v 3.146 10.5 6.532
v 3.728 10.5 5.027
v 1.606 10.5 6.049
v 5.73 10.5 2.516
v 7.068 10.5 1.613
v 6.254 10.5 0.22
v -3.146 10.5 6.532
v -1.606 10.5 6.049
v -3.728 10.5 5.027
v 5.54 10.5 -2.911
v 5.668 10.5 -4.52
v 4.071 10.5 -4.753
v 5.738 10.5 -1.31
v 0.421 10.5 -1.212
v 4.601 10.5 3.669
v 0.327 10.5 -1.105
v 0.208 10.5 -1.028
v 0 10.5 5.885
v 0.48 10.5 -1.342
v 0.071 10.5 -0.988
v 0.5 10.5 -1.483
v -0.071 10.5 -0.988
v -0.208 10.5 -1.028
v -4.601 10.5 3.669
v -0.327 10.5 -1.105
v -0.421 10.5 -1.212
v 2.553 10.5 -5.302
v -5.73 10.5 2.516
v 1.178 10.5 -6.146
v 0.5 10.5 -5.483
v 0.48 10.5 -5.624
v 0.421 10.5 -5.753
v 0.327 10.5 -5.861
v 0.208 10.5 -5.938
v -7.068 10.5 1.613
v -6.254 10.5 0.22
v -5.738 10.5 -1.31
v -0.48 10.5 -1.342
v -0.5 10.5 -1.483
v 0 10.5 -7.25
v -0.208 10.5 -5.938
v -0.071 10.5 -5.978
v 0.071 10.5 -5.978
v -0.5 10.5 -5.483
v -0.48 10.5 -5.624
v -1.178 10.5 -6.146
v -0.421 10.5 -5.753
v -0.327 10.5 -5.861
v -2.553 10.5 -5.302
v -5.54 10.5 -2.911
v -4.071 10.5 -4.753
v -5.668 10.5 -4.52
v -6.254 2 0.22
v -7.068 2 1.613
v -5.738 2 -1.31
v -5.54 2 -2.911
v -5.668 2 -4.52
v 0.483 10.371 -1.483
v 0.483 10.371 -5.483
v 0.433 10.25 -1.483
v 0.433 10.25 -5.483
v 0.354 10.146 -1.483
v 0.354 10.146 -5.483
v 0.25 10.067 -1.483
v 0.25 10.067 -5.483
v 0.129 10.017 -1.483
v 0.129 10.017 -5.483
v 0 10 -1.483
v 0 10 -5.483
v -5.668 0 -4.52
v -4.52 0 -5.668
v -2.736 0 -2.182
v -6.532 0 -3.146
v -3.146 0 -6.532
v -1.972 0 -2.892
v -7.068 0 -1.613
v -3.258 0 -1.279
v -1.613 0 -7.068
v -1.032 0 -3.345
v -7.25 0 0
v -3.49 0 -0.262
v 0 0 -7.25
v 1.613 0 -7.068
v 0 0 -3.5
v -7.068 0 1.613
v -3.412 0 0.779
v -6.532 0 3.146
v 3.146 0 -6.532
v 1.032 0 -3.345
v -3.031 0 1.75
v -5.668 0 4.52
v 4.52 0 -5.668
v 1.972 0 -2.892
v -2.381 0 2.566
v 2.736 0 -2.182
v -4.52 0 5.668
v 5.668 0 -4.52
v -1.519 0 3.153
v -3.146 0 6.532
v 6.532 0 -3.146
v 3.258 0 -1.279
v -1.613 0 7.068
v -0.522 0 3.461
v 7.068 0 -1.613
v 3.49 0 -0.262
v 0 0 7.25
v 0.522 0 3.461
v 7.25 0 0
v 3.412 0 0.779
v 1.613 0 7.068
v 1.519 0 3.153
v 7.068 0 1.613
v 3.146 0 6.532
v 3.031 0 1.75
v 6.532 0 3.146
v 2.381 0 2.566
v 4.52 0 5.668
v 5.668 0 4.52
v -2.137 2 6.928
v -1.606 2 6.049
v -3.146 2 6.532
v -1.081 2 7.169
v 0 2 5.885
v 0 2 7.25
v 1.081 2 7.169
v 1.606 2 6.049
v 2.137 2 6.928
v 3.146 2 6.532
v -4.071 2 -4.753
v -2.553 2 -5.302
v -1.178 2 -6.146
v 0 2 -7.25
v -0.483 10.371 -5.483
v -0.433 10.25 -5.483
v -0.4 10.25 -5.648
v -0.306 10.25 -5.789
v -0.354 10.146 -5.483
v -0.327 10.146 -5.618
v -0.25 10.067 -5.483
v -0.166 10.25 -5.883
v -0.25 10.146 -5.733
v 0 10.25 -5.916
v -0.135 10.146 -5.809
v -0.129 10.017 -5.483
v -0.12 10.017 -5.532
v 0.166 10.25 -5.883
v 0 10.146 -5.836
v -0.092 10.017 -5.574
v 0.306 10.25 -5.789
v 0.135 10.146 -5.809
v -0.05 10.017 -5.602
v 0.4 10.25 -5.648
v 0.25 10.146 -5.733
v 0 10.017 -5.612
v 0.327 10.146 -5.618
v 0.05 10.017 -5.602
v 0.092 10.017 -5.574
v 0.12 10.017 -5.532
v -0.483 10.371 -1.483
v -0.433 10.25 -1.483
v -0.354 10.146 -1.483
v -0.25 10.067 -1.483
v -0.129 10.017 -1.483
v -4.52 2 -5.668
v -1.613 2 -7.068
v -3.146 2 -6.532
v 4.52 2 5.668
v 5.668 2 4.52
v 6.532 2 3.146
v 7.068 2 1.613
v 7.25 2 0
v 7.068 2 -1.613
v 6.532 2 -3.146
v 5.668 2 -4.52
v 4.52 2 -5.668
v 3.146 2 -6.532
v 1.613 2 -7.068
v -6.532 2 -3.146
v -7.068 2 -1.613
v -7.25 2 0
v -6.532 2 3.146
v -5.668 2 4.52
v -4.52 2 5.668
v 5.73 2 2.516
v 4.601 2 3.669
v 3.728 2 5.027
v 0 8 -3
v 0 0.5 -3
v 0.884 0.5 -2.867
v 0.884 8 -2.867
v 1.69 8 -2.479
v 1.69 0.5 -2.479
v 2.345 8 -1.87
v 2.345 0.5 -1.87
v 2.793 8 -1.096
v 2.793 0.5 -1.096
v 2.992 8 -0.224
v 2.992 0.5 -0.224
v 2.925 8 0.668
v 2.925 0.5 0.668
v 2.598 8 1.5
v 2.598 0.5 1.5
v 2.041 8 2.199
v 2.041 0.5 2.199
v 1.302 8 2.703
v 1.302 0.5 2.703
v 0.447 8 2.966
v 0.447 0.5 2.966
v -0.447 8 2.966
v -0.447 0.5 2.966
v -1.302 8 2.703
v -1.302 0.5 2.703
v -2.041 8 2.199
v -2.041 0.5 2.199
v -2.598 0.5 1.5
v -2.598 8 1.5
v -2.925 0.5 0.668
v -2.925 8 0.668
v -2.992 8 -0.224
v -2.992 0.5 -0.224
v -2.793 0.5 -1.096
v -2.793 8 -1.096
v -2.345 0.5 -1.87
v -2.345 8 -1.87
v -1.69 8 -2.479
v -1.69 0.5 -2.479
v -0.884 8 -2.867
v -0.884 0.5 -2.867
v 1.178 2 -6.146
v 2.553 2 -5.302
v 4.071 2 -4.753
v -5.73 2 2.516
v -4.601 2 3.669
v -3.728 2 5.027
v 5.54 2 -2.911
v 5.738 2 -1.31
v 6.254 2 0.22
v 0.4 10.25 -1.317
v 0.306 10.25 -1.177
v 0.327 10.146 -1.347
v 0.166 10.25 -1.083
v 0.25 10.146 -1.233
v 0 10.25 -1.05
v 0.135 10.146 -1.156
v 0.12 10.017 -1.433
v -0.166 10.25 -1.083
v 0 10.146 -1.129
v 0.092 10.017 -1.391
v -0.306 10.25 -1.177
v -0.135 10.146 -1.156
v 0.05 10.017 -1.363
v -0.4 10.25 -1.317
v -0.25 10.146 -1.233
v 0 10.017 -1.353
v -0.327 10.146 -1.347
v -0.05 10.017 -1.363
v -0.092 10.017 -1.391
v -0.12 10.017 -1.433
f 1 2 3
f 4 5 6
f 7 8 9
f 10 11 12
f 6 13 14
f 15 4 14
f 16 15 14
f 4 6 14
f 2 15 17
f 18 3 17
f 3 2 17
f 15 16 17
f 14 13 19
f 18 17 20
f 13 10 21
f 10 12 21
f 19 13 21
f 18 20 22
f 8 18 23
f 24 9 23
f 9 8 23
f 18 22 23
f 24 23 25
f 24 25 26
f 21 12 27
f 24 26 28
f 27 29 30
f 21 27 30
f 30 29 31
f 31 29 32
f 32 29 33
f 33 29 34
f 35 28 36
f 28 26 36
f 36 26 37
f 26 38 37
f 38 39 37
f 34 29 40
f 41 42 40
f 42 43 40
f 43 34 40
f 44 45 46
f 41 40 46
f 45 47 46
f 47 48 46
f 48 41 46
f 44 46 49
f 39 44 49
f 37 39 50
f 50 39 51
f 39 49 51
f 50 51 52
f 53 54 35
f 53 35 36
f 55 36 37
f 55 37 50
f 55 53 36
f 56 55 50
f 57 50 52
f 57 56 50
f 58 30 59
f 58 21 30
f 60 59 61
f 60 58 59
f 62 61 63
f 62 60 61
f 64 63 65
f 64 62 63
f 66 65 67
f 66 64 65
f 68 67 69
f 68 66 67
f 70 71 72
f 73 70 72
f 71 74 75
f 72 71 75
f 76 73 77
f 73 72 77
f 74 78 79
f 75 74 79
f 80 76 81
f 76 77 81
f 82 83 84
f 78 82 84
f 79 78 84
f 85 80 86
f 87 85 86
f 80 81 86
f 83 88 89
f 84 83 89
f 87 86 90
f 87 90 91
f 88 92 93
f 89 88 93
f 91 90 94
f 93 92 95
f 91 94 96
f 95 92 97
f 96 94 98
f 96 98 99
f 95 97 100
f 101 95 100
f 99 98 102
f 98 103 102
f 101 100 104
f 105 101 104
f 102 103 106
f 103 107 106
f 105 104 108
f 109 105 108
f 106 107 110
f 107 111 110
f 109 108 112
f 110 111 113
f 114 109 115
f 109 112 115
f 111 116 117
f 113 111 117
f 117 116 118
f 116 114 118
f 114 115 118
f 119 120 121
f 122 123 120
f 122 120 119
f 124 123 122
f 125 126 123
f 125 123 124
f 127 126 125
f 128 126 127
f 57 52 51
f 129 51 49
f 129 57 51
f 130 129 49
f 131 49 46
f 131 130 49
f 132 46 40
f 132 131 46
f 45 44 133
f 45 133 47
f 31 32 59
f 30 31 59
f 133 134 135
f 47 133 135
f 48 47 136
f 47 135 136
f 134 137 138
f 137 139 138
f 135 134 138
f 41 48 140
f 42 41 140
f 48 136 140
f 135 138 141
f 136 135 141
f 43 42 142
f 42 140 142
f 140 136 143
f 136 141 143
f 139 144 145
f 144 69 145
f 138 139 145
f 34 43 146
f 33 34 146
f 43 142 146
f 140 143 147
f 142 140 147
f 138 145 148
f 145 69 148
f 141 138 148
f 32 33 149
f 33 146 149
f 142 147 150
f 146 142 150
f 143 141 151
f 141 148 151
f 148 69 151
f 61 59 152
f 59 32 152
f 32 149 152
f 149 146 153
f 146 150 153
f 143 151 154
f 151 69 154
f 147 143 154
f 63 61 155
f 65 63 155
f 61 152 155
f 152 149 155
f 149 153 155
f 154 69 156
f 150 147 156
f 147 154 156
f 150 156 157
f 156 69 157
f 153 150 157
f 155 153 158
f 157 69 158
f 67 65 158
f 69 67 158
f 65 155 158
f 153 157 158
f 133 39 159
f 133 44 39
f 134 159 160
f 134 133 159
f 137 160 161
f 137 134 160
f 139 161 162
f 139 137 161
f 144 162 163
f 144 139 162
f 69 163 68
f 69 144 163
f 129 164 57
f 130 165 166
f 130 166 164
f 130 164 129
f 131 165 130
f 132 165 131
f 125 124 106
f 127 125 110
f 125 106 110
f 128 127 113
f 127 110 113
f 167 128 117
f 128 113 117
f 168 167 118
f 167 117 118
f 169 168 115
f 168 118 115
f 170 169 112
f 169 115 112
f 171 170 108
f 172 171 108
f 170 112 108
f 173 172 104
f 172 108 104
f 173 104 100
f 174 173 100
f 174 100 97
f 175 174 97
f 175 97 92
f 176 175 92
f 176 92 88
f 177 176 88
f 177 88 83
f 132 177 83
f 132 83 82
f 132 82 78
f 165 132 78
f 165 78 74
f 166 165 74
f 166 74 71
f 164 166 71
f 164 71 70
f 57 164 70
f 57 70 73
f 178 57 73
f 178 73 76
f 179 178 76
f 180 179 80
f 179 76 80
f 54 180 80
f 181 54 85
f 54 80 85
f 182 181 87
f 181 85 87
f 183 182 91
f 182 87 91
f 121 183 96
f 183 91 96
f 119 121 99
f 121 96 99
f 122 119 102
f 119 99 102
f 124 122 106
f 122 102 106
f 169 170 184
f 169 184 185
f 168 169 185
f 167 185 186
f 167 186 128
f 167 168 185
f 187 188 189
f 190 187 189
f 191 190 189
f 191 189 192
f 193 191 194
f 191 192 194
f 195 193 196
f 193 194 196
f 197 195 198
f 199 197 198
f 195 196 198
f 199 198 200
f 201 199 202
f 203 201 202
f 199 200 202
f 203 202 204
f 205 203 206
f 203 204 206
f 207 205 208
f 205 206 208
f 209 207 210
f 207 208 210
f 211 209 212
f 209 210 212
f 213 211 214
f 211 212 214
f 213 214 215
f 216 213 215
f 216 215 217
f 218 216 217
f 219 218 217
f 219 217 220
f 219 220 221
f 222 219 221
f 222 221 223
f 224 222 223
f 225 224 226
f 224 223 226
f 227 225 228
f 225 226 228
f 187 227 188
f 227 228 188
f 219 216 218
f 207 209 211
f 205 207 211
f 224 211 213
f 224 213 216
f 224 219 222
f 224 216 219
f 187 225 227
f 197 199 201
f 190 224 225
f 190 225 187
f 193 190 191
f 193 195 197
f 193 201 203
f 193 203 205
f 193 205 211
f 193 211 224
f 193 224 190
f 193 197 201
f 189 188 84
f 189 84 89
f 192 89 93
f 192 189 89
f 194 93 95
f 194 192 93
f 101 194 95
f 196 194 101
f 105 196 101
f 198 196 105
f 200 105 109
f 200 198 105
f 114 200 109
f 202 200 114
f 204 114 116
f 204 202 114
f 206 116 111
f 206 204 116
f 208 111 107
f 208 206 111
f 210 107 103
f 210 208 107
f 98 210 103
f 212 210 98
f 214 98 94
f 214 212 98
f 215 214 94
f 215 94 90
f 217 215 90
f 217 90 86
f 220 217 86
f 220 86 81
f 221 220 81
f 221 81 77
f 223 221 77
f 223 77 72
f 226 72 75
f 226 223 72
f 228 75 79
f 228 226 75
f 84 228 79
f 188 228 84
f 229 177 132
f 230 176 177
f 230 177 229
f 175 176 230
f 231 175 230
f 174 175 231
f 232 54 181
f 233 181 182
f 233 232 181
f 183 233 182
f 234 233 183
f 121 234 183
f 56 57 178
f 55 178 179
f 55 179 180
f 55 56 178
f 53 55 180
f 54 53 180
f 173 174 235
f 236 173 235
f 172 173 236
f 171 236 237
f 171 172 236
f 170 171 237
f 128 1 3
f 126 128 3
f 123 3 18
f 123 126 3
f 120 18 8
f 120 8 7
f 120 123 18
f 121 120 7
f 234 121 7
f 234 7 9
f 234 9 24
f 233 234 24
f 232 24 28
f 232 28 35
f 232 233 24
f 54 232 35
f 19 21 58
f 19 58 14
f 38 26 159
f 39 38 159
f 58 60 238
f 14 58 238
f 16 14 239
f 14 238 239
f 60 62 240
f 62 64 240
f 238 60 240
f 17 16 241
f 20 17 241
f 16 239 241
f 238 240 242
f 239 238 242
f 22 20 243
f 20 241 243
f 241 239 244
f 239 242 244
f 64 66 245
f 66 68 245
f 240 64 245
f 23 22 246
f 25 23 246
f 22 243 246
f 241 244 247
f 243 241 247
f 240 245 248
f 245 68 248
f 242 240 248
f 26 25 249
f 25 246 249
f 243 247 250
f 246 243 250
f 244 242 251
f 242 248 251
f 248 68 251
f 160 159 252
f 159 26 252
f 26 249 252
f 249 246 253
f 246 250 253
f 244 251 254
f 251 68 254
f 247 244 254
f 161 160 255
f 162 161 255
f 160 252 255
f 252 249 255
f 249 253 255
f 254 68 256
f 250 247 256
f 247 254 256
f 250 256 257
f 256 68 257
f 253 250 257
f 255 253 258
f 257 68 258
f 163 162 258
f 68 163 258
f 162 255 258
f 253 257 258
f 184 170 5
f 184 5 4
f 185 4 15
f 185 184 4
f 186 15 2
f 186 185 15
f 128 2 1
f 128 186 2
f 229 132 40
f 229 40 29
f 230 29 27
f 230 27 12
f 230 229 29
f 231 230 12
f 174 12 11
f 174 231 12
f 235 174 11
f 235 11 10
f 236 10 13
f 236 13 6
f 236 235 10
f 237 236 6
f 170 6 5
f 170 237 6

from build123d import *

# Parameters (mm, degrees)
SKETCH1_R           = 7.25
BOSS_EXTRUDE1_DEPTH = 2
BOSS_EXTRUDE2_DEPTH = 8.5
INDICATOR_DEPTH     = 0.5
FILLET1_R           = 0.5
SKETCH4_R           = 3
CUT_EXTRUDE2_DEPTH  = 8
CHAMFER1_SIZE       = 0.5


with BuildPart() as part:
    # Sketch1 → Boss-Extrude1 (new body)
    with BuildSketch(Plane(origin=(0, 0, 0), x_dir=(1, 0, 0), z_dir=(0, 1, 0))):
        with Locations(Location((0, 0, 0), (0, 0, 270))):
            Circle(SKETCH1_R)
    extrude(amount=BOSS_EXTRUDE1_DEPTH)

    # Sketch2 → Boss-Extrude2 (add)
    with BuildSketch(Plane(origin=(0, 2, 0), x_dir=(1, 0, 0), z_dir=(0, 1, 0))):
        with BuildLine():
            ThreePointArc((0, 7.25), (2.553471118, 5.302337412), (5.668278248, 4.520301063))
            ThreePointArc((5.668278248, 4.520301063), (5.737597521, 1.309569193), (7.068227363, -1.613276771))
            ThreePointArc((7.068227363, -1.613276771), (4.601195965, -3.669331339), (3.145657109, -6.532024292))
            ThreePointArc((3.145657109, -6.532024292), (0, -5.885150532), (-3.145657109, -6.532024292))
            ThreePointArc((-3.145657109, -6.532024292), (-4.601195965, -3.669331339), (-7.068227363, -1.613276771))
            ThreePointArc((-7.068227363, -1.613276771), (-5.737597521, 1.309569193), (-5.668278248, 4.520301063))
            ThreePointArc((-5.668278248, 4.520301063), (-2.553471118, 5.302337412), (0, 7.25))
        make_face()
    extrude(amount=BOSS_EXTRUDE2_DEPTH)

    # Sketch3 → Indicator (cut)
    with BuildSketch(Plane(origin=(0, 10.5, 0), x_dir=(1, 0, 0), z_dir=(0, 1, 0))):
        with BuildLine():
            Line((0.5, 5.482775584), (0.5, 1.482775584))
            ThreePointArc((0.5, 1.482775584), (0, 0.982775584), (-0.5, 1.482775584))
            Line((-0.5, 1.482775584), (-0.5, 5.482775584))
            ThreePointArc((-0.5, 5.482775584), (0, 5.982775584), (0.5, 5.482775584))
        make_face()
    extrude(amount=-INDICATOR_DEPTH, mode=Mode.SUBTRACT)

    # Fillet1
    fillet1_edges = [part.edges().sort_by_distance(p)[0] for p in [
        (0.5, 10, -3.482775584),
        (0, 10, -0.982775584),
        (-0.5, 10, -3.482775584),
        (0, 10, -5.982775584),
    ]]
    fillet(fillet1_edges, radius=FILLET1_R - 0.0001)  # a hair under: the kernel refuses the full size

    # Sketch4 → Cut-Extrude2 (cut)
    with BuildSketch(Plane(origin=(0, 0, 0), x_dir=(-1, 0, 0), z_dir=(0, -1, 0))):
        with Locations(Location((0, 0, 0), (0, 0, 90))):
            Circle(SKETCH4_R)
    extrude(amount=-CUT_EXTRUDE2_DEPTH, mode=Mode.SUBTRACT)

    # Chamfer1
    chamfer1_edges = [part.edges().sort_by_distance(p)[0] for p in [
        (0, 0, 3),
    ]]
    chamfer(chamfer1_edges, length=CHAMFER1_SIZE)


solid = part.part
